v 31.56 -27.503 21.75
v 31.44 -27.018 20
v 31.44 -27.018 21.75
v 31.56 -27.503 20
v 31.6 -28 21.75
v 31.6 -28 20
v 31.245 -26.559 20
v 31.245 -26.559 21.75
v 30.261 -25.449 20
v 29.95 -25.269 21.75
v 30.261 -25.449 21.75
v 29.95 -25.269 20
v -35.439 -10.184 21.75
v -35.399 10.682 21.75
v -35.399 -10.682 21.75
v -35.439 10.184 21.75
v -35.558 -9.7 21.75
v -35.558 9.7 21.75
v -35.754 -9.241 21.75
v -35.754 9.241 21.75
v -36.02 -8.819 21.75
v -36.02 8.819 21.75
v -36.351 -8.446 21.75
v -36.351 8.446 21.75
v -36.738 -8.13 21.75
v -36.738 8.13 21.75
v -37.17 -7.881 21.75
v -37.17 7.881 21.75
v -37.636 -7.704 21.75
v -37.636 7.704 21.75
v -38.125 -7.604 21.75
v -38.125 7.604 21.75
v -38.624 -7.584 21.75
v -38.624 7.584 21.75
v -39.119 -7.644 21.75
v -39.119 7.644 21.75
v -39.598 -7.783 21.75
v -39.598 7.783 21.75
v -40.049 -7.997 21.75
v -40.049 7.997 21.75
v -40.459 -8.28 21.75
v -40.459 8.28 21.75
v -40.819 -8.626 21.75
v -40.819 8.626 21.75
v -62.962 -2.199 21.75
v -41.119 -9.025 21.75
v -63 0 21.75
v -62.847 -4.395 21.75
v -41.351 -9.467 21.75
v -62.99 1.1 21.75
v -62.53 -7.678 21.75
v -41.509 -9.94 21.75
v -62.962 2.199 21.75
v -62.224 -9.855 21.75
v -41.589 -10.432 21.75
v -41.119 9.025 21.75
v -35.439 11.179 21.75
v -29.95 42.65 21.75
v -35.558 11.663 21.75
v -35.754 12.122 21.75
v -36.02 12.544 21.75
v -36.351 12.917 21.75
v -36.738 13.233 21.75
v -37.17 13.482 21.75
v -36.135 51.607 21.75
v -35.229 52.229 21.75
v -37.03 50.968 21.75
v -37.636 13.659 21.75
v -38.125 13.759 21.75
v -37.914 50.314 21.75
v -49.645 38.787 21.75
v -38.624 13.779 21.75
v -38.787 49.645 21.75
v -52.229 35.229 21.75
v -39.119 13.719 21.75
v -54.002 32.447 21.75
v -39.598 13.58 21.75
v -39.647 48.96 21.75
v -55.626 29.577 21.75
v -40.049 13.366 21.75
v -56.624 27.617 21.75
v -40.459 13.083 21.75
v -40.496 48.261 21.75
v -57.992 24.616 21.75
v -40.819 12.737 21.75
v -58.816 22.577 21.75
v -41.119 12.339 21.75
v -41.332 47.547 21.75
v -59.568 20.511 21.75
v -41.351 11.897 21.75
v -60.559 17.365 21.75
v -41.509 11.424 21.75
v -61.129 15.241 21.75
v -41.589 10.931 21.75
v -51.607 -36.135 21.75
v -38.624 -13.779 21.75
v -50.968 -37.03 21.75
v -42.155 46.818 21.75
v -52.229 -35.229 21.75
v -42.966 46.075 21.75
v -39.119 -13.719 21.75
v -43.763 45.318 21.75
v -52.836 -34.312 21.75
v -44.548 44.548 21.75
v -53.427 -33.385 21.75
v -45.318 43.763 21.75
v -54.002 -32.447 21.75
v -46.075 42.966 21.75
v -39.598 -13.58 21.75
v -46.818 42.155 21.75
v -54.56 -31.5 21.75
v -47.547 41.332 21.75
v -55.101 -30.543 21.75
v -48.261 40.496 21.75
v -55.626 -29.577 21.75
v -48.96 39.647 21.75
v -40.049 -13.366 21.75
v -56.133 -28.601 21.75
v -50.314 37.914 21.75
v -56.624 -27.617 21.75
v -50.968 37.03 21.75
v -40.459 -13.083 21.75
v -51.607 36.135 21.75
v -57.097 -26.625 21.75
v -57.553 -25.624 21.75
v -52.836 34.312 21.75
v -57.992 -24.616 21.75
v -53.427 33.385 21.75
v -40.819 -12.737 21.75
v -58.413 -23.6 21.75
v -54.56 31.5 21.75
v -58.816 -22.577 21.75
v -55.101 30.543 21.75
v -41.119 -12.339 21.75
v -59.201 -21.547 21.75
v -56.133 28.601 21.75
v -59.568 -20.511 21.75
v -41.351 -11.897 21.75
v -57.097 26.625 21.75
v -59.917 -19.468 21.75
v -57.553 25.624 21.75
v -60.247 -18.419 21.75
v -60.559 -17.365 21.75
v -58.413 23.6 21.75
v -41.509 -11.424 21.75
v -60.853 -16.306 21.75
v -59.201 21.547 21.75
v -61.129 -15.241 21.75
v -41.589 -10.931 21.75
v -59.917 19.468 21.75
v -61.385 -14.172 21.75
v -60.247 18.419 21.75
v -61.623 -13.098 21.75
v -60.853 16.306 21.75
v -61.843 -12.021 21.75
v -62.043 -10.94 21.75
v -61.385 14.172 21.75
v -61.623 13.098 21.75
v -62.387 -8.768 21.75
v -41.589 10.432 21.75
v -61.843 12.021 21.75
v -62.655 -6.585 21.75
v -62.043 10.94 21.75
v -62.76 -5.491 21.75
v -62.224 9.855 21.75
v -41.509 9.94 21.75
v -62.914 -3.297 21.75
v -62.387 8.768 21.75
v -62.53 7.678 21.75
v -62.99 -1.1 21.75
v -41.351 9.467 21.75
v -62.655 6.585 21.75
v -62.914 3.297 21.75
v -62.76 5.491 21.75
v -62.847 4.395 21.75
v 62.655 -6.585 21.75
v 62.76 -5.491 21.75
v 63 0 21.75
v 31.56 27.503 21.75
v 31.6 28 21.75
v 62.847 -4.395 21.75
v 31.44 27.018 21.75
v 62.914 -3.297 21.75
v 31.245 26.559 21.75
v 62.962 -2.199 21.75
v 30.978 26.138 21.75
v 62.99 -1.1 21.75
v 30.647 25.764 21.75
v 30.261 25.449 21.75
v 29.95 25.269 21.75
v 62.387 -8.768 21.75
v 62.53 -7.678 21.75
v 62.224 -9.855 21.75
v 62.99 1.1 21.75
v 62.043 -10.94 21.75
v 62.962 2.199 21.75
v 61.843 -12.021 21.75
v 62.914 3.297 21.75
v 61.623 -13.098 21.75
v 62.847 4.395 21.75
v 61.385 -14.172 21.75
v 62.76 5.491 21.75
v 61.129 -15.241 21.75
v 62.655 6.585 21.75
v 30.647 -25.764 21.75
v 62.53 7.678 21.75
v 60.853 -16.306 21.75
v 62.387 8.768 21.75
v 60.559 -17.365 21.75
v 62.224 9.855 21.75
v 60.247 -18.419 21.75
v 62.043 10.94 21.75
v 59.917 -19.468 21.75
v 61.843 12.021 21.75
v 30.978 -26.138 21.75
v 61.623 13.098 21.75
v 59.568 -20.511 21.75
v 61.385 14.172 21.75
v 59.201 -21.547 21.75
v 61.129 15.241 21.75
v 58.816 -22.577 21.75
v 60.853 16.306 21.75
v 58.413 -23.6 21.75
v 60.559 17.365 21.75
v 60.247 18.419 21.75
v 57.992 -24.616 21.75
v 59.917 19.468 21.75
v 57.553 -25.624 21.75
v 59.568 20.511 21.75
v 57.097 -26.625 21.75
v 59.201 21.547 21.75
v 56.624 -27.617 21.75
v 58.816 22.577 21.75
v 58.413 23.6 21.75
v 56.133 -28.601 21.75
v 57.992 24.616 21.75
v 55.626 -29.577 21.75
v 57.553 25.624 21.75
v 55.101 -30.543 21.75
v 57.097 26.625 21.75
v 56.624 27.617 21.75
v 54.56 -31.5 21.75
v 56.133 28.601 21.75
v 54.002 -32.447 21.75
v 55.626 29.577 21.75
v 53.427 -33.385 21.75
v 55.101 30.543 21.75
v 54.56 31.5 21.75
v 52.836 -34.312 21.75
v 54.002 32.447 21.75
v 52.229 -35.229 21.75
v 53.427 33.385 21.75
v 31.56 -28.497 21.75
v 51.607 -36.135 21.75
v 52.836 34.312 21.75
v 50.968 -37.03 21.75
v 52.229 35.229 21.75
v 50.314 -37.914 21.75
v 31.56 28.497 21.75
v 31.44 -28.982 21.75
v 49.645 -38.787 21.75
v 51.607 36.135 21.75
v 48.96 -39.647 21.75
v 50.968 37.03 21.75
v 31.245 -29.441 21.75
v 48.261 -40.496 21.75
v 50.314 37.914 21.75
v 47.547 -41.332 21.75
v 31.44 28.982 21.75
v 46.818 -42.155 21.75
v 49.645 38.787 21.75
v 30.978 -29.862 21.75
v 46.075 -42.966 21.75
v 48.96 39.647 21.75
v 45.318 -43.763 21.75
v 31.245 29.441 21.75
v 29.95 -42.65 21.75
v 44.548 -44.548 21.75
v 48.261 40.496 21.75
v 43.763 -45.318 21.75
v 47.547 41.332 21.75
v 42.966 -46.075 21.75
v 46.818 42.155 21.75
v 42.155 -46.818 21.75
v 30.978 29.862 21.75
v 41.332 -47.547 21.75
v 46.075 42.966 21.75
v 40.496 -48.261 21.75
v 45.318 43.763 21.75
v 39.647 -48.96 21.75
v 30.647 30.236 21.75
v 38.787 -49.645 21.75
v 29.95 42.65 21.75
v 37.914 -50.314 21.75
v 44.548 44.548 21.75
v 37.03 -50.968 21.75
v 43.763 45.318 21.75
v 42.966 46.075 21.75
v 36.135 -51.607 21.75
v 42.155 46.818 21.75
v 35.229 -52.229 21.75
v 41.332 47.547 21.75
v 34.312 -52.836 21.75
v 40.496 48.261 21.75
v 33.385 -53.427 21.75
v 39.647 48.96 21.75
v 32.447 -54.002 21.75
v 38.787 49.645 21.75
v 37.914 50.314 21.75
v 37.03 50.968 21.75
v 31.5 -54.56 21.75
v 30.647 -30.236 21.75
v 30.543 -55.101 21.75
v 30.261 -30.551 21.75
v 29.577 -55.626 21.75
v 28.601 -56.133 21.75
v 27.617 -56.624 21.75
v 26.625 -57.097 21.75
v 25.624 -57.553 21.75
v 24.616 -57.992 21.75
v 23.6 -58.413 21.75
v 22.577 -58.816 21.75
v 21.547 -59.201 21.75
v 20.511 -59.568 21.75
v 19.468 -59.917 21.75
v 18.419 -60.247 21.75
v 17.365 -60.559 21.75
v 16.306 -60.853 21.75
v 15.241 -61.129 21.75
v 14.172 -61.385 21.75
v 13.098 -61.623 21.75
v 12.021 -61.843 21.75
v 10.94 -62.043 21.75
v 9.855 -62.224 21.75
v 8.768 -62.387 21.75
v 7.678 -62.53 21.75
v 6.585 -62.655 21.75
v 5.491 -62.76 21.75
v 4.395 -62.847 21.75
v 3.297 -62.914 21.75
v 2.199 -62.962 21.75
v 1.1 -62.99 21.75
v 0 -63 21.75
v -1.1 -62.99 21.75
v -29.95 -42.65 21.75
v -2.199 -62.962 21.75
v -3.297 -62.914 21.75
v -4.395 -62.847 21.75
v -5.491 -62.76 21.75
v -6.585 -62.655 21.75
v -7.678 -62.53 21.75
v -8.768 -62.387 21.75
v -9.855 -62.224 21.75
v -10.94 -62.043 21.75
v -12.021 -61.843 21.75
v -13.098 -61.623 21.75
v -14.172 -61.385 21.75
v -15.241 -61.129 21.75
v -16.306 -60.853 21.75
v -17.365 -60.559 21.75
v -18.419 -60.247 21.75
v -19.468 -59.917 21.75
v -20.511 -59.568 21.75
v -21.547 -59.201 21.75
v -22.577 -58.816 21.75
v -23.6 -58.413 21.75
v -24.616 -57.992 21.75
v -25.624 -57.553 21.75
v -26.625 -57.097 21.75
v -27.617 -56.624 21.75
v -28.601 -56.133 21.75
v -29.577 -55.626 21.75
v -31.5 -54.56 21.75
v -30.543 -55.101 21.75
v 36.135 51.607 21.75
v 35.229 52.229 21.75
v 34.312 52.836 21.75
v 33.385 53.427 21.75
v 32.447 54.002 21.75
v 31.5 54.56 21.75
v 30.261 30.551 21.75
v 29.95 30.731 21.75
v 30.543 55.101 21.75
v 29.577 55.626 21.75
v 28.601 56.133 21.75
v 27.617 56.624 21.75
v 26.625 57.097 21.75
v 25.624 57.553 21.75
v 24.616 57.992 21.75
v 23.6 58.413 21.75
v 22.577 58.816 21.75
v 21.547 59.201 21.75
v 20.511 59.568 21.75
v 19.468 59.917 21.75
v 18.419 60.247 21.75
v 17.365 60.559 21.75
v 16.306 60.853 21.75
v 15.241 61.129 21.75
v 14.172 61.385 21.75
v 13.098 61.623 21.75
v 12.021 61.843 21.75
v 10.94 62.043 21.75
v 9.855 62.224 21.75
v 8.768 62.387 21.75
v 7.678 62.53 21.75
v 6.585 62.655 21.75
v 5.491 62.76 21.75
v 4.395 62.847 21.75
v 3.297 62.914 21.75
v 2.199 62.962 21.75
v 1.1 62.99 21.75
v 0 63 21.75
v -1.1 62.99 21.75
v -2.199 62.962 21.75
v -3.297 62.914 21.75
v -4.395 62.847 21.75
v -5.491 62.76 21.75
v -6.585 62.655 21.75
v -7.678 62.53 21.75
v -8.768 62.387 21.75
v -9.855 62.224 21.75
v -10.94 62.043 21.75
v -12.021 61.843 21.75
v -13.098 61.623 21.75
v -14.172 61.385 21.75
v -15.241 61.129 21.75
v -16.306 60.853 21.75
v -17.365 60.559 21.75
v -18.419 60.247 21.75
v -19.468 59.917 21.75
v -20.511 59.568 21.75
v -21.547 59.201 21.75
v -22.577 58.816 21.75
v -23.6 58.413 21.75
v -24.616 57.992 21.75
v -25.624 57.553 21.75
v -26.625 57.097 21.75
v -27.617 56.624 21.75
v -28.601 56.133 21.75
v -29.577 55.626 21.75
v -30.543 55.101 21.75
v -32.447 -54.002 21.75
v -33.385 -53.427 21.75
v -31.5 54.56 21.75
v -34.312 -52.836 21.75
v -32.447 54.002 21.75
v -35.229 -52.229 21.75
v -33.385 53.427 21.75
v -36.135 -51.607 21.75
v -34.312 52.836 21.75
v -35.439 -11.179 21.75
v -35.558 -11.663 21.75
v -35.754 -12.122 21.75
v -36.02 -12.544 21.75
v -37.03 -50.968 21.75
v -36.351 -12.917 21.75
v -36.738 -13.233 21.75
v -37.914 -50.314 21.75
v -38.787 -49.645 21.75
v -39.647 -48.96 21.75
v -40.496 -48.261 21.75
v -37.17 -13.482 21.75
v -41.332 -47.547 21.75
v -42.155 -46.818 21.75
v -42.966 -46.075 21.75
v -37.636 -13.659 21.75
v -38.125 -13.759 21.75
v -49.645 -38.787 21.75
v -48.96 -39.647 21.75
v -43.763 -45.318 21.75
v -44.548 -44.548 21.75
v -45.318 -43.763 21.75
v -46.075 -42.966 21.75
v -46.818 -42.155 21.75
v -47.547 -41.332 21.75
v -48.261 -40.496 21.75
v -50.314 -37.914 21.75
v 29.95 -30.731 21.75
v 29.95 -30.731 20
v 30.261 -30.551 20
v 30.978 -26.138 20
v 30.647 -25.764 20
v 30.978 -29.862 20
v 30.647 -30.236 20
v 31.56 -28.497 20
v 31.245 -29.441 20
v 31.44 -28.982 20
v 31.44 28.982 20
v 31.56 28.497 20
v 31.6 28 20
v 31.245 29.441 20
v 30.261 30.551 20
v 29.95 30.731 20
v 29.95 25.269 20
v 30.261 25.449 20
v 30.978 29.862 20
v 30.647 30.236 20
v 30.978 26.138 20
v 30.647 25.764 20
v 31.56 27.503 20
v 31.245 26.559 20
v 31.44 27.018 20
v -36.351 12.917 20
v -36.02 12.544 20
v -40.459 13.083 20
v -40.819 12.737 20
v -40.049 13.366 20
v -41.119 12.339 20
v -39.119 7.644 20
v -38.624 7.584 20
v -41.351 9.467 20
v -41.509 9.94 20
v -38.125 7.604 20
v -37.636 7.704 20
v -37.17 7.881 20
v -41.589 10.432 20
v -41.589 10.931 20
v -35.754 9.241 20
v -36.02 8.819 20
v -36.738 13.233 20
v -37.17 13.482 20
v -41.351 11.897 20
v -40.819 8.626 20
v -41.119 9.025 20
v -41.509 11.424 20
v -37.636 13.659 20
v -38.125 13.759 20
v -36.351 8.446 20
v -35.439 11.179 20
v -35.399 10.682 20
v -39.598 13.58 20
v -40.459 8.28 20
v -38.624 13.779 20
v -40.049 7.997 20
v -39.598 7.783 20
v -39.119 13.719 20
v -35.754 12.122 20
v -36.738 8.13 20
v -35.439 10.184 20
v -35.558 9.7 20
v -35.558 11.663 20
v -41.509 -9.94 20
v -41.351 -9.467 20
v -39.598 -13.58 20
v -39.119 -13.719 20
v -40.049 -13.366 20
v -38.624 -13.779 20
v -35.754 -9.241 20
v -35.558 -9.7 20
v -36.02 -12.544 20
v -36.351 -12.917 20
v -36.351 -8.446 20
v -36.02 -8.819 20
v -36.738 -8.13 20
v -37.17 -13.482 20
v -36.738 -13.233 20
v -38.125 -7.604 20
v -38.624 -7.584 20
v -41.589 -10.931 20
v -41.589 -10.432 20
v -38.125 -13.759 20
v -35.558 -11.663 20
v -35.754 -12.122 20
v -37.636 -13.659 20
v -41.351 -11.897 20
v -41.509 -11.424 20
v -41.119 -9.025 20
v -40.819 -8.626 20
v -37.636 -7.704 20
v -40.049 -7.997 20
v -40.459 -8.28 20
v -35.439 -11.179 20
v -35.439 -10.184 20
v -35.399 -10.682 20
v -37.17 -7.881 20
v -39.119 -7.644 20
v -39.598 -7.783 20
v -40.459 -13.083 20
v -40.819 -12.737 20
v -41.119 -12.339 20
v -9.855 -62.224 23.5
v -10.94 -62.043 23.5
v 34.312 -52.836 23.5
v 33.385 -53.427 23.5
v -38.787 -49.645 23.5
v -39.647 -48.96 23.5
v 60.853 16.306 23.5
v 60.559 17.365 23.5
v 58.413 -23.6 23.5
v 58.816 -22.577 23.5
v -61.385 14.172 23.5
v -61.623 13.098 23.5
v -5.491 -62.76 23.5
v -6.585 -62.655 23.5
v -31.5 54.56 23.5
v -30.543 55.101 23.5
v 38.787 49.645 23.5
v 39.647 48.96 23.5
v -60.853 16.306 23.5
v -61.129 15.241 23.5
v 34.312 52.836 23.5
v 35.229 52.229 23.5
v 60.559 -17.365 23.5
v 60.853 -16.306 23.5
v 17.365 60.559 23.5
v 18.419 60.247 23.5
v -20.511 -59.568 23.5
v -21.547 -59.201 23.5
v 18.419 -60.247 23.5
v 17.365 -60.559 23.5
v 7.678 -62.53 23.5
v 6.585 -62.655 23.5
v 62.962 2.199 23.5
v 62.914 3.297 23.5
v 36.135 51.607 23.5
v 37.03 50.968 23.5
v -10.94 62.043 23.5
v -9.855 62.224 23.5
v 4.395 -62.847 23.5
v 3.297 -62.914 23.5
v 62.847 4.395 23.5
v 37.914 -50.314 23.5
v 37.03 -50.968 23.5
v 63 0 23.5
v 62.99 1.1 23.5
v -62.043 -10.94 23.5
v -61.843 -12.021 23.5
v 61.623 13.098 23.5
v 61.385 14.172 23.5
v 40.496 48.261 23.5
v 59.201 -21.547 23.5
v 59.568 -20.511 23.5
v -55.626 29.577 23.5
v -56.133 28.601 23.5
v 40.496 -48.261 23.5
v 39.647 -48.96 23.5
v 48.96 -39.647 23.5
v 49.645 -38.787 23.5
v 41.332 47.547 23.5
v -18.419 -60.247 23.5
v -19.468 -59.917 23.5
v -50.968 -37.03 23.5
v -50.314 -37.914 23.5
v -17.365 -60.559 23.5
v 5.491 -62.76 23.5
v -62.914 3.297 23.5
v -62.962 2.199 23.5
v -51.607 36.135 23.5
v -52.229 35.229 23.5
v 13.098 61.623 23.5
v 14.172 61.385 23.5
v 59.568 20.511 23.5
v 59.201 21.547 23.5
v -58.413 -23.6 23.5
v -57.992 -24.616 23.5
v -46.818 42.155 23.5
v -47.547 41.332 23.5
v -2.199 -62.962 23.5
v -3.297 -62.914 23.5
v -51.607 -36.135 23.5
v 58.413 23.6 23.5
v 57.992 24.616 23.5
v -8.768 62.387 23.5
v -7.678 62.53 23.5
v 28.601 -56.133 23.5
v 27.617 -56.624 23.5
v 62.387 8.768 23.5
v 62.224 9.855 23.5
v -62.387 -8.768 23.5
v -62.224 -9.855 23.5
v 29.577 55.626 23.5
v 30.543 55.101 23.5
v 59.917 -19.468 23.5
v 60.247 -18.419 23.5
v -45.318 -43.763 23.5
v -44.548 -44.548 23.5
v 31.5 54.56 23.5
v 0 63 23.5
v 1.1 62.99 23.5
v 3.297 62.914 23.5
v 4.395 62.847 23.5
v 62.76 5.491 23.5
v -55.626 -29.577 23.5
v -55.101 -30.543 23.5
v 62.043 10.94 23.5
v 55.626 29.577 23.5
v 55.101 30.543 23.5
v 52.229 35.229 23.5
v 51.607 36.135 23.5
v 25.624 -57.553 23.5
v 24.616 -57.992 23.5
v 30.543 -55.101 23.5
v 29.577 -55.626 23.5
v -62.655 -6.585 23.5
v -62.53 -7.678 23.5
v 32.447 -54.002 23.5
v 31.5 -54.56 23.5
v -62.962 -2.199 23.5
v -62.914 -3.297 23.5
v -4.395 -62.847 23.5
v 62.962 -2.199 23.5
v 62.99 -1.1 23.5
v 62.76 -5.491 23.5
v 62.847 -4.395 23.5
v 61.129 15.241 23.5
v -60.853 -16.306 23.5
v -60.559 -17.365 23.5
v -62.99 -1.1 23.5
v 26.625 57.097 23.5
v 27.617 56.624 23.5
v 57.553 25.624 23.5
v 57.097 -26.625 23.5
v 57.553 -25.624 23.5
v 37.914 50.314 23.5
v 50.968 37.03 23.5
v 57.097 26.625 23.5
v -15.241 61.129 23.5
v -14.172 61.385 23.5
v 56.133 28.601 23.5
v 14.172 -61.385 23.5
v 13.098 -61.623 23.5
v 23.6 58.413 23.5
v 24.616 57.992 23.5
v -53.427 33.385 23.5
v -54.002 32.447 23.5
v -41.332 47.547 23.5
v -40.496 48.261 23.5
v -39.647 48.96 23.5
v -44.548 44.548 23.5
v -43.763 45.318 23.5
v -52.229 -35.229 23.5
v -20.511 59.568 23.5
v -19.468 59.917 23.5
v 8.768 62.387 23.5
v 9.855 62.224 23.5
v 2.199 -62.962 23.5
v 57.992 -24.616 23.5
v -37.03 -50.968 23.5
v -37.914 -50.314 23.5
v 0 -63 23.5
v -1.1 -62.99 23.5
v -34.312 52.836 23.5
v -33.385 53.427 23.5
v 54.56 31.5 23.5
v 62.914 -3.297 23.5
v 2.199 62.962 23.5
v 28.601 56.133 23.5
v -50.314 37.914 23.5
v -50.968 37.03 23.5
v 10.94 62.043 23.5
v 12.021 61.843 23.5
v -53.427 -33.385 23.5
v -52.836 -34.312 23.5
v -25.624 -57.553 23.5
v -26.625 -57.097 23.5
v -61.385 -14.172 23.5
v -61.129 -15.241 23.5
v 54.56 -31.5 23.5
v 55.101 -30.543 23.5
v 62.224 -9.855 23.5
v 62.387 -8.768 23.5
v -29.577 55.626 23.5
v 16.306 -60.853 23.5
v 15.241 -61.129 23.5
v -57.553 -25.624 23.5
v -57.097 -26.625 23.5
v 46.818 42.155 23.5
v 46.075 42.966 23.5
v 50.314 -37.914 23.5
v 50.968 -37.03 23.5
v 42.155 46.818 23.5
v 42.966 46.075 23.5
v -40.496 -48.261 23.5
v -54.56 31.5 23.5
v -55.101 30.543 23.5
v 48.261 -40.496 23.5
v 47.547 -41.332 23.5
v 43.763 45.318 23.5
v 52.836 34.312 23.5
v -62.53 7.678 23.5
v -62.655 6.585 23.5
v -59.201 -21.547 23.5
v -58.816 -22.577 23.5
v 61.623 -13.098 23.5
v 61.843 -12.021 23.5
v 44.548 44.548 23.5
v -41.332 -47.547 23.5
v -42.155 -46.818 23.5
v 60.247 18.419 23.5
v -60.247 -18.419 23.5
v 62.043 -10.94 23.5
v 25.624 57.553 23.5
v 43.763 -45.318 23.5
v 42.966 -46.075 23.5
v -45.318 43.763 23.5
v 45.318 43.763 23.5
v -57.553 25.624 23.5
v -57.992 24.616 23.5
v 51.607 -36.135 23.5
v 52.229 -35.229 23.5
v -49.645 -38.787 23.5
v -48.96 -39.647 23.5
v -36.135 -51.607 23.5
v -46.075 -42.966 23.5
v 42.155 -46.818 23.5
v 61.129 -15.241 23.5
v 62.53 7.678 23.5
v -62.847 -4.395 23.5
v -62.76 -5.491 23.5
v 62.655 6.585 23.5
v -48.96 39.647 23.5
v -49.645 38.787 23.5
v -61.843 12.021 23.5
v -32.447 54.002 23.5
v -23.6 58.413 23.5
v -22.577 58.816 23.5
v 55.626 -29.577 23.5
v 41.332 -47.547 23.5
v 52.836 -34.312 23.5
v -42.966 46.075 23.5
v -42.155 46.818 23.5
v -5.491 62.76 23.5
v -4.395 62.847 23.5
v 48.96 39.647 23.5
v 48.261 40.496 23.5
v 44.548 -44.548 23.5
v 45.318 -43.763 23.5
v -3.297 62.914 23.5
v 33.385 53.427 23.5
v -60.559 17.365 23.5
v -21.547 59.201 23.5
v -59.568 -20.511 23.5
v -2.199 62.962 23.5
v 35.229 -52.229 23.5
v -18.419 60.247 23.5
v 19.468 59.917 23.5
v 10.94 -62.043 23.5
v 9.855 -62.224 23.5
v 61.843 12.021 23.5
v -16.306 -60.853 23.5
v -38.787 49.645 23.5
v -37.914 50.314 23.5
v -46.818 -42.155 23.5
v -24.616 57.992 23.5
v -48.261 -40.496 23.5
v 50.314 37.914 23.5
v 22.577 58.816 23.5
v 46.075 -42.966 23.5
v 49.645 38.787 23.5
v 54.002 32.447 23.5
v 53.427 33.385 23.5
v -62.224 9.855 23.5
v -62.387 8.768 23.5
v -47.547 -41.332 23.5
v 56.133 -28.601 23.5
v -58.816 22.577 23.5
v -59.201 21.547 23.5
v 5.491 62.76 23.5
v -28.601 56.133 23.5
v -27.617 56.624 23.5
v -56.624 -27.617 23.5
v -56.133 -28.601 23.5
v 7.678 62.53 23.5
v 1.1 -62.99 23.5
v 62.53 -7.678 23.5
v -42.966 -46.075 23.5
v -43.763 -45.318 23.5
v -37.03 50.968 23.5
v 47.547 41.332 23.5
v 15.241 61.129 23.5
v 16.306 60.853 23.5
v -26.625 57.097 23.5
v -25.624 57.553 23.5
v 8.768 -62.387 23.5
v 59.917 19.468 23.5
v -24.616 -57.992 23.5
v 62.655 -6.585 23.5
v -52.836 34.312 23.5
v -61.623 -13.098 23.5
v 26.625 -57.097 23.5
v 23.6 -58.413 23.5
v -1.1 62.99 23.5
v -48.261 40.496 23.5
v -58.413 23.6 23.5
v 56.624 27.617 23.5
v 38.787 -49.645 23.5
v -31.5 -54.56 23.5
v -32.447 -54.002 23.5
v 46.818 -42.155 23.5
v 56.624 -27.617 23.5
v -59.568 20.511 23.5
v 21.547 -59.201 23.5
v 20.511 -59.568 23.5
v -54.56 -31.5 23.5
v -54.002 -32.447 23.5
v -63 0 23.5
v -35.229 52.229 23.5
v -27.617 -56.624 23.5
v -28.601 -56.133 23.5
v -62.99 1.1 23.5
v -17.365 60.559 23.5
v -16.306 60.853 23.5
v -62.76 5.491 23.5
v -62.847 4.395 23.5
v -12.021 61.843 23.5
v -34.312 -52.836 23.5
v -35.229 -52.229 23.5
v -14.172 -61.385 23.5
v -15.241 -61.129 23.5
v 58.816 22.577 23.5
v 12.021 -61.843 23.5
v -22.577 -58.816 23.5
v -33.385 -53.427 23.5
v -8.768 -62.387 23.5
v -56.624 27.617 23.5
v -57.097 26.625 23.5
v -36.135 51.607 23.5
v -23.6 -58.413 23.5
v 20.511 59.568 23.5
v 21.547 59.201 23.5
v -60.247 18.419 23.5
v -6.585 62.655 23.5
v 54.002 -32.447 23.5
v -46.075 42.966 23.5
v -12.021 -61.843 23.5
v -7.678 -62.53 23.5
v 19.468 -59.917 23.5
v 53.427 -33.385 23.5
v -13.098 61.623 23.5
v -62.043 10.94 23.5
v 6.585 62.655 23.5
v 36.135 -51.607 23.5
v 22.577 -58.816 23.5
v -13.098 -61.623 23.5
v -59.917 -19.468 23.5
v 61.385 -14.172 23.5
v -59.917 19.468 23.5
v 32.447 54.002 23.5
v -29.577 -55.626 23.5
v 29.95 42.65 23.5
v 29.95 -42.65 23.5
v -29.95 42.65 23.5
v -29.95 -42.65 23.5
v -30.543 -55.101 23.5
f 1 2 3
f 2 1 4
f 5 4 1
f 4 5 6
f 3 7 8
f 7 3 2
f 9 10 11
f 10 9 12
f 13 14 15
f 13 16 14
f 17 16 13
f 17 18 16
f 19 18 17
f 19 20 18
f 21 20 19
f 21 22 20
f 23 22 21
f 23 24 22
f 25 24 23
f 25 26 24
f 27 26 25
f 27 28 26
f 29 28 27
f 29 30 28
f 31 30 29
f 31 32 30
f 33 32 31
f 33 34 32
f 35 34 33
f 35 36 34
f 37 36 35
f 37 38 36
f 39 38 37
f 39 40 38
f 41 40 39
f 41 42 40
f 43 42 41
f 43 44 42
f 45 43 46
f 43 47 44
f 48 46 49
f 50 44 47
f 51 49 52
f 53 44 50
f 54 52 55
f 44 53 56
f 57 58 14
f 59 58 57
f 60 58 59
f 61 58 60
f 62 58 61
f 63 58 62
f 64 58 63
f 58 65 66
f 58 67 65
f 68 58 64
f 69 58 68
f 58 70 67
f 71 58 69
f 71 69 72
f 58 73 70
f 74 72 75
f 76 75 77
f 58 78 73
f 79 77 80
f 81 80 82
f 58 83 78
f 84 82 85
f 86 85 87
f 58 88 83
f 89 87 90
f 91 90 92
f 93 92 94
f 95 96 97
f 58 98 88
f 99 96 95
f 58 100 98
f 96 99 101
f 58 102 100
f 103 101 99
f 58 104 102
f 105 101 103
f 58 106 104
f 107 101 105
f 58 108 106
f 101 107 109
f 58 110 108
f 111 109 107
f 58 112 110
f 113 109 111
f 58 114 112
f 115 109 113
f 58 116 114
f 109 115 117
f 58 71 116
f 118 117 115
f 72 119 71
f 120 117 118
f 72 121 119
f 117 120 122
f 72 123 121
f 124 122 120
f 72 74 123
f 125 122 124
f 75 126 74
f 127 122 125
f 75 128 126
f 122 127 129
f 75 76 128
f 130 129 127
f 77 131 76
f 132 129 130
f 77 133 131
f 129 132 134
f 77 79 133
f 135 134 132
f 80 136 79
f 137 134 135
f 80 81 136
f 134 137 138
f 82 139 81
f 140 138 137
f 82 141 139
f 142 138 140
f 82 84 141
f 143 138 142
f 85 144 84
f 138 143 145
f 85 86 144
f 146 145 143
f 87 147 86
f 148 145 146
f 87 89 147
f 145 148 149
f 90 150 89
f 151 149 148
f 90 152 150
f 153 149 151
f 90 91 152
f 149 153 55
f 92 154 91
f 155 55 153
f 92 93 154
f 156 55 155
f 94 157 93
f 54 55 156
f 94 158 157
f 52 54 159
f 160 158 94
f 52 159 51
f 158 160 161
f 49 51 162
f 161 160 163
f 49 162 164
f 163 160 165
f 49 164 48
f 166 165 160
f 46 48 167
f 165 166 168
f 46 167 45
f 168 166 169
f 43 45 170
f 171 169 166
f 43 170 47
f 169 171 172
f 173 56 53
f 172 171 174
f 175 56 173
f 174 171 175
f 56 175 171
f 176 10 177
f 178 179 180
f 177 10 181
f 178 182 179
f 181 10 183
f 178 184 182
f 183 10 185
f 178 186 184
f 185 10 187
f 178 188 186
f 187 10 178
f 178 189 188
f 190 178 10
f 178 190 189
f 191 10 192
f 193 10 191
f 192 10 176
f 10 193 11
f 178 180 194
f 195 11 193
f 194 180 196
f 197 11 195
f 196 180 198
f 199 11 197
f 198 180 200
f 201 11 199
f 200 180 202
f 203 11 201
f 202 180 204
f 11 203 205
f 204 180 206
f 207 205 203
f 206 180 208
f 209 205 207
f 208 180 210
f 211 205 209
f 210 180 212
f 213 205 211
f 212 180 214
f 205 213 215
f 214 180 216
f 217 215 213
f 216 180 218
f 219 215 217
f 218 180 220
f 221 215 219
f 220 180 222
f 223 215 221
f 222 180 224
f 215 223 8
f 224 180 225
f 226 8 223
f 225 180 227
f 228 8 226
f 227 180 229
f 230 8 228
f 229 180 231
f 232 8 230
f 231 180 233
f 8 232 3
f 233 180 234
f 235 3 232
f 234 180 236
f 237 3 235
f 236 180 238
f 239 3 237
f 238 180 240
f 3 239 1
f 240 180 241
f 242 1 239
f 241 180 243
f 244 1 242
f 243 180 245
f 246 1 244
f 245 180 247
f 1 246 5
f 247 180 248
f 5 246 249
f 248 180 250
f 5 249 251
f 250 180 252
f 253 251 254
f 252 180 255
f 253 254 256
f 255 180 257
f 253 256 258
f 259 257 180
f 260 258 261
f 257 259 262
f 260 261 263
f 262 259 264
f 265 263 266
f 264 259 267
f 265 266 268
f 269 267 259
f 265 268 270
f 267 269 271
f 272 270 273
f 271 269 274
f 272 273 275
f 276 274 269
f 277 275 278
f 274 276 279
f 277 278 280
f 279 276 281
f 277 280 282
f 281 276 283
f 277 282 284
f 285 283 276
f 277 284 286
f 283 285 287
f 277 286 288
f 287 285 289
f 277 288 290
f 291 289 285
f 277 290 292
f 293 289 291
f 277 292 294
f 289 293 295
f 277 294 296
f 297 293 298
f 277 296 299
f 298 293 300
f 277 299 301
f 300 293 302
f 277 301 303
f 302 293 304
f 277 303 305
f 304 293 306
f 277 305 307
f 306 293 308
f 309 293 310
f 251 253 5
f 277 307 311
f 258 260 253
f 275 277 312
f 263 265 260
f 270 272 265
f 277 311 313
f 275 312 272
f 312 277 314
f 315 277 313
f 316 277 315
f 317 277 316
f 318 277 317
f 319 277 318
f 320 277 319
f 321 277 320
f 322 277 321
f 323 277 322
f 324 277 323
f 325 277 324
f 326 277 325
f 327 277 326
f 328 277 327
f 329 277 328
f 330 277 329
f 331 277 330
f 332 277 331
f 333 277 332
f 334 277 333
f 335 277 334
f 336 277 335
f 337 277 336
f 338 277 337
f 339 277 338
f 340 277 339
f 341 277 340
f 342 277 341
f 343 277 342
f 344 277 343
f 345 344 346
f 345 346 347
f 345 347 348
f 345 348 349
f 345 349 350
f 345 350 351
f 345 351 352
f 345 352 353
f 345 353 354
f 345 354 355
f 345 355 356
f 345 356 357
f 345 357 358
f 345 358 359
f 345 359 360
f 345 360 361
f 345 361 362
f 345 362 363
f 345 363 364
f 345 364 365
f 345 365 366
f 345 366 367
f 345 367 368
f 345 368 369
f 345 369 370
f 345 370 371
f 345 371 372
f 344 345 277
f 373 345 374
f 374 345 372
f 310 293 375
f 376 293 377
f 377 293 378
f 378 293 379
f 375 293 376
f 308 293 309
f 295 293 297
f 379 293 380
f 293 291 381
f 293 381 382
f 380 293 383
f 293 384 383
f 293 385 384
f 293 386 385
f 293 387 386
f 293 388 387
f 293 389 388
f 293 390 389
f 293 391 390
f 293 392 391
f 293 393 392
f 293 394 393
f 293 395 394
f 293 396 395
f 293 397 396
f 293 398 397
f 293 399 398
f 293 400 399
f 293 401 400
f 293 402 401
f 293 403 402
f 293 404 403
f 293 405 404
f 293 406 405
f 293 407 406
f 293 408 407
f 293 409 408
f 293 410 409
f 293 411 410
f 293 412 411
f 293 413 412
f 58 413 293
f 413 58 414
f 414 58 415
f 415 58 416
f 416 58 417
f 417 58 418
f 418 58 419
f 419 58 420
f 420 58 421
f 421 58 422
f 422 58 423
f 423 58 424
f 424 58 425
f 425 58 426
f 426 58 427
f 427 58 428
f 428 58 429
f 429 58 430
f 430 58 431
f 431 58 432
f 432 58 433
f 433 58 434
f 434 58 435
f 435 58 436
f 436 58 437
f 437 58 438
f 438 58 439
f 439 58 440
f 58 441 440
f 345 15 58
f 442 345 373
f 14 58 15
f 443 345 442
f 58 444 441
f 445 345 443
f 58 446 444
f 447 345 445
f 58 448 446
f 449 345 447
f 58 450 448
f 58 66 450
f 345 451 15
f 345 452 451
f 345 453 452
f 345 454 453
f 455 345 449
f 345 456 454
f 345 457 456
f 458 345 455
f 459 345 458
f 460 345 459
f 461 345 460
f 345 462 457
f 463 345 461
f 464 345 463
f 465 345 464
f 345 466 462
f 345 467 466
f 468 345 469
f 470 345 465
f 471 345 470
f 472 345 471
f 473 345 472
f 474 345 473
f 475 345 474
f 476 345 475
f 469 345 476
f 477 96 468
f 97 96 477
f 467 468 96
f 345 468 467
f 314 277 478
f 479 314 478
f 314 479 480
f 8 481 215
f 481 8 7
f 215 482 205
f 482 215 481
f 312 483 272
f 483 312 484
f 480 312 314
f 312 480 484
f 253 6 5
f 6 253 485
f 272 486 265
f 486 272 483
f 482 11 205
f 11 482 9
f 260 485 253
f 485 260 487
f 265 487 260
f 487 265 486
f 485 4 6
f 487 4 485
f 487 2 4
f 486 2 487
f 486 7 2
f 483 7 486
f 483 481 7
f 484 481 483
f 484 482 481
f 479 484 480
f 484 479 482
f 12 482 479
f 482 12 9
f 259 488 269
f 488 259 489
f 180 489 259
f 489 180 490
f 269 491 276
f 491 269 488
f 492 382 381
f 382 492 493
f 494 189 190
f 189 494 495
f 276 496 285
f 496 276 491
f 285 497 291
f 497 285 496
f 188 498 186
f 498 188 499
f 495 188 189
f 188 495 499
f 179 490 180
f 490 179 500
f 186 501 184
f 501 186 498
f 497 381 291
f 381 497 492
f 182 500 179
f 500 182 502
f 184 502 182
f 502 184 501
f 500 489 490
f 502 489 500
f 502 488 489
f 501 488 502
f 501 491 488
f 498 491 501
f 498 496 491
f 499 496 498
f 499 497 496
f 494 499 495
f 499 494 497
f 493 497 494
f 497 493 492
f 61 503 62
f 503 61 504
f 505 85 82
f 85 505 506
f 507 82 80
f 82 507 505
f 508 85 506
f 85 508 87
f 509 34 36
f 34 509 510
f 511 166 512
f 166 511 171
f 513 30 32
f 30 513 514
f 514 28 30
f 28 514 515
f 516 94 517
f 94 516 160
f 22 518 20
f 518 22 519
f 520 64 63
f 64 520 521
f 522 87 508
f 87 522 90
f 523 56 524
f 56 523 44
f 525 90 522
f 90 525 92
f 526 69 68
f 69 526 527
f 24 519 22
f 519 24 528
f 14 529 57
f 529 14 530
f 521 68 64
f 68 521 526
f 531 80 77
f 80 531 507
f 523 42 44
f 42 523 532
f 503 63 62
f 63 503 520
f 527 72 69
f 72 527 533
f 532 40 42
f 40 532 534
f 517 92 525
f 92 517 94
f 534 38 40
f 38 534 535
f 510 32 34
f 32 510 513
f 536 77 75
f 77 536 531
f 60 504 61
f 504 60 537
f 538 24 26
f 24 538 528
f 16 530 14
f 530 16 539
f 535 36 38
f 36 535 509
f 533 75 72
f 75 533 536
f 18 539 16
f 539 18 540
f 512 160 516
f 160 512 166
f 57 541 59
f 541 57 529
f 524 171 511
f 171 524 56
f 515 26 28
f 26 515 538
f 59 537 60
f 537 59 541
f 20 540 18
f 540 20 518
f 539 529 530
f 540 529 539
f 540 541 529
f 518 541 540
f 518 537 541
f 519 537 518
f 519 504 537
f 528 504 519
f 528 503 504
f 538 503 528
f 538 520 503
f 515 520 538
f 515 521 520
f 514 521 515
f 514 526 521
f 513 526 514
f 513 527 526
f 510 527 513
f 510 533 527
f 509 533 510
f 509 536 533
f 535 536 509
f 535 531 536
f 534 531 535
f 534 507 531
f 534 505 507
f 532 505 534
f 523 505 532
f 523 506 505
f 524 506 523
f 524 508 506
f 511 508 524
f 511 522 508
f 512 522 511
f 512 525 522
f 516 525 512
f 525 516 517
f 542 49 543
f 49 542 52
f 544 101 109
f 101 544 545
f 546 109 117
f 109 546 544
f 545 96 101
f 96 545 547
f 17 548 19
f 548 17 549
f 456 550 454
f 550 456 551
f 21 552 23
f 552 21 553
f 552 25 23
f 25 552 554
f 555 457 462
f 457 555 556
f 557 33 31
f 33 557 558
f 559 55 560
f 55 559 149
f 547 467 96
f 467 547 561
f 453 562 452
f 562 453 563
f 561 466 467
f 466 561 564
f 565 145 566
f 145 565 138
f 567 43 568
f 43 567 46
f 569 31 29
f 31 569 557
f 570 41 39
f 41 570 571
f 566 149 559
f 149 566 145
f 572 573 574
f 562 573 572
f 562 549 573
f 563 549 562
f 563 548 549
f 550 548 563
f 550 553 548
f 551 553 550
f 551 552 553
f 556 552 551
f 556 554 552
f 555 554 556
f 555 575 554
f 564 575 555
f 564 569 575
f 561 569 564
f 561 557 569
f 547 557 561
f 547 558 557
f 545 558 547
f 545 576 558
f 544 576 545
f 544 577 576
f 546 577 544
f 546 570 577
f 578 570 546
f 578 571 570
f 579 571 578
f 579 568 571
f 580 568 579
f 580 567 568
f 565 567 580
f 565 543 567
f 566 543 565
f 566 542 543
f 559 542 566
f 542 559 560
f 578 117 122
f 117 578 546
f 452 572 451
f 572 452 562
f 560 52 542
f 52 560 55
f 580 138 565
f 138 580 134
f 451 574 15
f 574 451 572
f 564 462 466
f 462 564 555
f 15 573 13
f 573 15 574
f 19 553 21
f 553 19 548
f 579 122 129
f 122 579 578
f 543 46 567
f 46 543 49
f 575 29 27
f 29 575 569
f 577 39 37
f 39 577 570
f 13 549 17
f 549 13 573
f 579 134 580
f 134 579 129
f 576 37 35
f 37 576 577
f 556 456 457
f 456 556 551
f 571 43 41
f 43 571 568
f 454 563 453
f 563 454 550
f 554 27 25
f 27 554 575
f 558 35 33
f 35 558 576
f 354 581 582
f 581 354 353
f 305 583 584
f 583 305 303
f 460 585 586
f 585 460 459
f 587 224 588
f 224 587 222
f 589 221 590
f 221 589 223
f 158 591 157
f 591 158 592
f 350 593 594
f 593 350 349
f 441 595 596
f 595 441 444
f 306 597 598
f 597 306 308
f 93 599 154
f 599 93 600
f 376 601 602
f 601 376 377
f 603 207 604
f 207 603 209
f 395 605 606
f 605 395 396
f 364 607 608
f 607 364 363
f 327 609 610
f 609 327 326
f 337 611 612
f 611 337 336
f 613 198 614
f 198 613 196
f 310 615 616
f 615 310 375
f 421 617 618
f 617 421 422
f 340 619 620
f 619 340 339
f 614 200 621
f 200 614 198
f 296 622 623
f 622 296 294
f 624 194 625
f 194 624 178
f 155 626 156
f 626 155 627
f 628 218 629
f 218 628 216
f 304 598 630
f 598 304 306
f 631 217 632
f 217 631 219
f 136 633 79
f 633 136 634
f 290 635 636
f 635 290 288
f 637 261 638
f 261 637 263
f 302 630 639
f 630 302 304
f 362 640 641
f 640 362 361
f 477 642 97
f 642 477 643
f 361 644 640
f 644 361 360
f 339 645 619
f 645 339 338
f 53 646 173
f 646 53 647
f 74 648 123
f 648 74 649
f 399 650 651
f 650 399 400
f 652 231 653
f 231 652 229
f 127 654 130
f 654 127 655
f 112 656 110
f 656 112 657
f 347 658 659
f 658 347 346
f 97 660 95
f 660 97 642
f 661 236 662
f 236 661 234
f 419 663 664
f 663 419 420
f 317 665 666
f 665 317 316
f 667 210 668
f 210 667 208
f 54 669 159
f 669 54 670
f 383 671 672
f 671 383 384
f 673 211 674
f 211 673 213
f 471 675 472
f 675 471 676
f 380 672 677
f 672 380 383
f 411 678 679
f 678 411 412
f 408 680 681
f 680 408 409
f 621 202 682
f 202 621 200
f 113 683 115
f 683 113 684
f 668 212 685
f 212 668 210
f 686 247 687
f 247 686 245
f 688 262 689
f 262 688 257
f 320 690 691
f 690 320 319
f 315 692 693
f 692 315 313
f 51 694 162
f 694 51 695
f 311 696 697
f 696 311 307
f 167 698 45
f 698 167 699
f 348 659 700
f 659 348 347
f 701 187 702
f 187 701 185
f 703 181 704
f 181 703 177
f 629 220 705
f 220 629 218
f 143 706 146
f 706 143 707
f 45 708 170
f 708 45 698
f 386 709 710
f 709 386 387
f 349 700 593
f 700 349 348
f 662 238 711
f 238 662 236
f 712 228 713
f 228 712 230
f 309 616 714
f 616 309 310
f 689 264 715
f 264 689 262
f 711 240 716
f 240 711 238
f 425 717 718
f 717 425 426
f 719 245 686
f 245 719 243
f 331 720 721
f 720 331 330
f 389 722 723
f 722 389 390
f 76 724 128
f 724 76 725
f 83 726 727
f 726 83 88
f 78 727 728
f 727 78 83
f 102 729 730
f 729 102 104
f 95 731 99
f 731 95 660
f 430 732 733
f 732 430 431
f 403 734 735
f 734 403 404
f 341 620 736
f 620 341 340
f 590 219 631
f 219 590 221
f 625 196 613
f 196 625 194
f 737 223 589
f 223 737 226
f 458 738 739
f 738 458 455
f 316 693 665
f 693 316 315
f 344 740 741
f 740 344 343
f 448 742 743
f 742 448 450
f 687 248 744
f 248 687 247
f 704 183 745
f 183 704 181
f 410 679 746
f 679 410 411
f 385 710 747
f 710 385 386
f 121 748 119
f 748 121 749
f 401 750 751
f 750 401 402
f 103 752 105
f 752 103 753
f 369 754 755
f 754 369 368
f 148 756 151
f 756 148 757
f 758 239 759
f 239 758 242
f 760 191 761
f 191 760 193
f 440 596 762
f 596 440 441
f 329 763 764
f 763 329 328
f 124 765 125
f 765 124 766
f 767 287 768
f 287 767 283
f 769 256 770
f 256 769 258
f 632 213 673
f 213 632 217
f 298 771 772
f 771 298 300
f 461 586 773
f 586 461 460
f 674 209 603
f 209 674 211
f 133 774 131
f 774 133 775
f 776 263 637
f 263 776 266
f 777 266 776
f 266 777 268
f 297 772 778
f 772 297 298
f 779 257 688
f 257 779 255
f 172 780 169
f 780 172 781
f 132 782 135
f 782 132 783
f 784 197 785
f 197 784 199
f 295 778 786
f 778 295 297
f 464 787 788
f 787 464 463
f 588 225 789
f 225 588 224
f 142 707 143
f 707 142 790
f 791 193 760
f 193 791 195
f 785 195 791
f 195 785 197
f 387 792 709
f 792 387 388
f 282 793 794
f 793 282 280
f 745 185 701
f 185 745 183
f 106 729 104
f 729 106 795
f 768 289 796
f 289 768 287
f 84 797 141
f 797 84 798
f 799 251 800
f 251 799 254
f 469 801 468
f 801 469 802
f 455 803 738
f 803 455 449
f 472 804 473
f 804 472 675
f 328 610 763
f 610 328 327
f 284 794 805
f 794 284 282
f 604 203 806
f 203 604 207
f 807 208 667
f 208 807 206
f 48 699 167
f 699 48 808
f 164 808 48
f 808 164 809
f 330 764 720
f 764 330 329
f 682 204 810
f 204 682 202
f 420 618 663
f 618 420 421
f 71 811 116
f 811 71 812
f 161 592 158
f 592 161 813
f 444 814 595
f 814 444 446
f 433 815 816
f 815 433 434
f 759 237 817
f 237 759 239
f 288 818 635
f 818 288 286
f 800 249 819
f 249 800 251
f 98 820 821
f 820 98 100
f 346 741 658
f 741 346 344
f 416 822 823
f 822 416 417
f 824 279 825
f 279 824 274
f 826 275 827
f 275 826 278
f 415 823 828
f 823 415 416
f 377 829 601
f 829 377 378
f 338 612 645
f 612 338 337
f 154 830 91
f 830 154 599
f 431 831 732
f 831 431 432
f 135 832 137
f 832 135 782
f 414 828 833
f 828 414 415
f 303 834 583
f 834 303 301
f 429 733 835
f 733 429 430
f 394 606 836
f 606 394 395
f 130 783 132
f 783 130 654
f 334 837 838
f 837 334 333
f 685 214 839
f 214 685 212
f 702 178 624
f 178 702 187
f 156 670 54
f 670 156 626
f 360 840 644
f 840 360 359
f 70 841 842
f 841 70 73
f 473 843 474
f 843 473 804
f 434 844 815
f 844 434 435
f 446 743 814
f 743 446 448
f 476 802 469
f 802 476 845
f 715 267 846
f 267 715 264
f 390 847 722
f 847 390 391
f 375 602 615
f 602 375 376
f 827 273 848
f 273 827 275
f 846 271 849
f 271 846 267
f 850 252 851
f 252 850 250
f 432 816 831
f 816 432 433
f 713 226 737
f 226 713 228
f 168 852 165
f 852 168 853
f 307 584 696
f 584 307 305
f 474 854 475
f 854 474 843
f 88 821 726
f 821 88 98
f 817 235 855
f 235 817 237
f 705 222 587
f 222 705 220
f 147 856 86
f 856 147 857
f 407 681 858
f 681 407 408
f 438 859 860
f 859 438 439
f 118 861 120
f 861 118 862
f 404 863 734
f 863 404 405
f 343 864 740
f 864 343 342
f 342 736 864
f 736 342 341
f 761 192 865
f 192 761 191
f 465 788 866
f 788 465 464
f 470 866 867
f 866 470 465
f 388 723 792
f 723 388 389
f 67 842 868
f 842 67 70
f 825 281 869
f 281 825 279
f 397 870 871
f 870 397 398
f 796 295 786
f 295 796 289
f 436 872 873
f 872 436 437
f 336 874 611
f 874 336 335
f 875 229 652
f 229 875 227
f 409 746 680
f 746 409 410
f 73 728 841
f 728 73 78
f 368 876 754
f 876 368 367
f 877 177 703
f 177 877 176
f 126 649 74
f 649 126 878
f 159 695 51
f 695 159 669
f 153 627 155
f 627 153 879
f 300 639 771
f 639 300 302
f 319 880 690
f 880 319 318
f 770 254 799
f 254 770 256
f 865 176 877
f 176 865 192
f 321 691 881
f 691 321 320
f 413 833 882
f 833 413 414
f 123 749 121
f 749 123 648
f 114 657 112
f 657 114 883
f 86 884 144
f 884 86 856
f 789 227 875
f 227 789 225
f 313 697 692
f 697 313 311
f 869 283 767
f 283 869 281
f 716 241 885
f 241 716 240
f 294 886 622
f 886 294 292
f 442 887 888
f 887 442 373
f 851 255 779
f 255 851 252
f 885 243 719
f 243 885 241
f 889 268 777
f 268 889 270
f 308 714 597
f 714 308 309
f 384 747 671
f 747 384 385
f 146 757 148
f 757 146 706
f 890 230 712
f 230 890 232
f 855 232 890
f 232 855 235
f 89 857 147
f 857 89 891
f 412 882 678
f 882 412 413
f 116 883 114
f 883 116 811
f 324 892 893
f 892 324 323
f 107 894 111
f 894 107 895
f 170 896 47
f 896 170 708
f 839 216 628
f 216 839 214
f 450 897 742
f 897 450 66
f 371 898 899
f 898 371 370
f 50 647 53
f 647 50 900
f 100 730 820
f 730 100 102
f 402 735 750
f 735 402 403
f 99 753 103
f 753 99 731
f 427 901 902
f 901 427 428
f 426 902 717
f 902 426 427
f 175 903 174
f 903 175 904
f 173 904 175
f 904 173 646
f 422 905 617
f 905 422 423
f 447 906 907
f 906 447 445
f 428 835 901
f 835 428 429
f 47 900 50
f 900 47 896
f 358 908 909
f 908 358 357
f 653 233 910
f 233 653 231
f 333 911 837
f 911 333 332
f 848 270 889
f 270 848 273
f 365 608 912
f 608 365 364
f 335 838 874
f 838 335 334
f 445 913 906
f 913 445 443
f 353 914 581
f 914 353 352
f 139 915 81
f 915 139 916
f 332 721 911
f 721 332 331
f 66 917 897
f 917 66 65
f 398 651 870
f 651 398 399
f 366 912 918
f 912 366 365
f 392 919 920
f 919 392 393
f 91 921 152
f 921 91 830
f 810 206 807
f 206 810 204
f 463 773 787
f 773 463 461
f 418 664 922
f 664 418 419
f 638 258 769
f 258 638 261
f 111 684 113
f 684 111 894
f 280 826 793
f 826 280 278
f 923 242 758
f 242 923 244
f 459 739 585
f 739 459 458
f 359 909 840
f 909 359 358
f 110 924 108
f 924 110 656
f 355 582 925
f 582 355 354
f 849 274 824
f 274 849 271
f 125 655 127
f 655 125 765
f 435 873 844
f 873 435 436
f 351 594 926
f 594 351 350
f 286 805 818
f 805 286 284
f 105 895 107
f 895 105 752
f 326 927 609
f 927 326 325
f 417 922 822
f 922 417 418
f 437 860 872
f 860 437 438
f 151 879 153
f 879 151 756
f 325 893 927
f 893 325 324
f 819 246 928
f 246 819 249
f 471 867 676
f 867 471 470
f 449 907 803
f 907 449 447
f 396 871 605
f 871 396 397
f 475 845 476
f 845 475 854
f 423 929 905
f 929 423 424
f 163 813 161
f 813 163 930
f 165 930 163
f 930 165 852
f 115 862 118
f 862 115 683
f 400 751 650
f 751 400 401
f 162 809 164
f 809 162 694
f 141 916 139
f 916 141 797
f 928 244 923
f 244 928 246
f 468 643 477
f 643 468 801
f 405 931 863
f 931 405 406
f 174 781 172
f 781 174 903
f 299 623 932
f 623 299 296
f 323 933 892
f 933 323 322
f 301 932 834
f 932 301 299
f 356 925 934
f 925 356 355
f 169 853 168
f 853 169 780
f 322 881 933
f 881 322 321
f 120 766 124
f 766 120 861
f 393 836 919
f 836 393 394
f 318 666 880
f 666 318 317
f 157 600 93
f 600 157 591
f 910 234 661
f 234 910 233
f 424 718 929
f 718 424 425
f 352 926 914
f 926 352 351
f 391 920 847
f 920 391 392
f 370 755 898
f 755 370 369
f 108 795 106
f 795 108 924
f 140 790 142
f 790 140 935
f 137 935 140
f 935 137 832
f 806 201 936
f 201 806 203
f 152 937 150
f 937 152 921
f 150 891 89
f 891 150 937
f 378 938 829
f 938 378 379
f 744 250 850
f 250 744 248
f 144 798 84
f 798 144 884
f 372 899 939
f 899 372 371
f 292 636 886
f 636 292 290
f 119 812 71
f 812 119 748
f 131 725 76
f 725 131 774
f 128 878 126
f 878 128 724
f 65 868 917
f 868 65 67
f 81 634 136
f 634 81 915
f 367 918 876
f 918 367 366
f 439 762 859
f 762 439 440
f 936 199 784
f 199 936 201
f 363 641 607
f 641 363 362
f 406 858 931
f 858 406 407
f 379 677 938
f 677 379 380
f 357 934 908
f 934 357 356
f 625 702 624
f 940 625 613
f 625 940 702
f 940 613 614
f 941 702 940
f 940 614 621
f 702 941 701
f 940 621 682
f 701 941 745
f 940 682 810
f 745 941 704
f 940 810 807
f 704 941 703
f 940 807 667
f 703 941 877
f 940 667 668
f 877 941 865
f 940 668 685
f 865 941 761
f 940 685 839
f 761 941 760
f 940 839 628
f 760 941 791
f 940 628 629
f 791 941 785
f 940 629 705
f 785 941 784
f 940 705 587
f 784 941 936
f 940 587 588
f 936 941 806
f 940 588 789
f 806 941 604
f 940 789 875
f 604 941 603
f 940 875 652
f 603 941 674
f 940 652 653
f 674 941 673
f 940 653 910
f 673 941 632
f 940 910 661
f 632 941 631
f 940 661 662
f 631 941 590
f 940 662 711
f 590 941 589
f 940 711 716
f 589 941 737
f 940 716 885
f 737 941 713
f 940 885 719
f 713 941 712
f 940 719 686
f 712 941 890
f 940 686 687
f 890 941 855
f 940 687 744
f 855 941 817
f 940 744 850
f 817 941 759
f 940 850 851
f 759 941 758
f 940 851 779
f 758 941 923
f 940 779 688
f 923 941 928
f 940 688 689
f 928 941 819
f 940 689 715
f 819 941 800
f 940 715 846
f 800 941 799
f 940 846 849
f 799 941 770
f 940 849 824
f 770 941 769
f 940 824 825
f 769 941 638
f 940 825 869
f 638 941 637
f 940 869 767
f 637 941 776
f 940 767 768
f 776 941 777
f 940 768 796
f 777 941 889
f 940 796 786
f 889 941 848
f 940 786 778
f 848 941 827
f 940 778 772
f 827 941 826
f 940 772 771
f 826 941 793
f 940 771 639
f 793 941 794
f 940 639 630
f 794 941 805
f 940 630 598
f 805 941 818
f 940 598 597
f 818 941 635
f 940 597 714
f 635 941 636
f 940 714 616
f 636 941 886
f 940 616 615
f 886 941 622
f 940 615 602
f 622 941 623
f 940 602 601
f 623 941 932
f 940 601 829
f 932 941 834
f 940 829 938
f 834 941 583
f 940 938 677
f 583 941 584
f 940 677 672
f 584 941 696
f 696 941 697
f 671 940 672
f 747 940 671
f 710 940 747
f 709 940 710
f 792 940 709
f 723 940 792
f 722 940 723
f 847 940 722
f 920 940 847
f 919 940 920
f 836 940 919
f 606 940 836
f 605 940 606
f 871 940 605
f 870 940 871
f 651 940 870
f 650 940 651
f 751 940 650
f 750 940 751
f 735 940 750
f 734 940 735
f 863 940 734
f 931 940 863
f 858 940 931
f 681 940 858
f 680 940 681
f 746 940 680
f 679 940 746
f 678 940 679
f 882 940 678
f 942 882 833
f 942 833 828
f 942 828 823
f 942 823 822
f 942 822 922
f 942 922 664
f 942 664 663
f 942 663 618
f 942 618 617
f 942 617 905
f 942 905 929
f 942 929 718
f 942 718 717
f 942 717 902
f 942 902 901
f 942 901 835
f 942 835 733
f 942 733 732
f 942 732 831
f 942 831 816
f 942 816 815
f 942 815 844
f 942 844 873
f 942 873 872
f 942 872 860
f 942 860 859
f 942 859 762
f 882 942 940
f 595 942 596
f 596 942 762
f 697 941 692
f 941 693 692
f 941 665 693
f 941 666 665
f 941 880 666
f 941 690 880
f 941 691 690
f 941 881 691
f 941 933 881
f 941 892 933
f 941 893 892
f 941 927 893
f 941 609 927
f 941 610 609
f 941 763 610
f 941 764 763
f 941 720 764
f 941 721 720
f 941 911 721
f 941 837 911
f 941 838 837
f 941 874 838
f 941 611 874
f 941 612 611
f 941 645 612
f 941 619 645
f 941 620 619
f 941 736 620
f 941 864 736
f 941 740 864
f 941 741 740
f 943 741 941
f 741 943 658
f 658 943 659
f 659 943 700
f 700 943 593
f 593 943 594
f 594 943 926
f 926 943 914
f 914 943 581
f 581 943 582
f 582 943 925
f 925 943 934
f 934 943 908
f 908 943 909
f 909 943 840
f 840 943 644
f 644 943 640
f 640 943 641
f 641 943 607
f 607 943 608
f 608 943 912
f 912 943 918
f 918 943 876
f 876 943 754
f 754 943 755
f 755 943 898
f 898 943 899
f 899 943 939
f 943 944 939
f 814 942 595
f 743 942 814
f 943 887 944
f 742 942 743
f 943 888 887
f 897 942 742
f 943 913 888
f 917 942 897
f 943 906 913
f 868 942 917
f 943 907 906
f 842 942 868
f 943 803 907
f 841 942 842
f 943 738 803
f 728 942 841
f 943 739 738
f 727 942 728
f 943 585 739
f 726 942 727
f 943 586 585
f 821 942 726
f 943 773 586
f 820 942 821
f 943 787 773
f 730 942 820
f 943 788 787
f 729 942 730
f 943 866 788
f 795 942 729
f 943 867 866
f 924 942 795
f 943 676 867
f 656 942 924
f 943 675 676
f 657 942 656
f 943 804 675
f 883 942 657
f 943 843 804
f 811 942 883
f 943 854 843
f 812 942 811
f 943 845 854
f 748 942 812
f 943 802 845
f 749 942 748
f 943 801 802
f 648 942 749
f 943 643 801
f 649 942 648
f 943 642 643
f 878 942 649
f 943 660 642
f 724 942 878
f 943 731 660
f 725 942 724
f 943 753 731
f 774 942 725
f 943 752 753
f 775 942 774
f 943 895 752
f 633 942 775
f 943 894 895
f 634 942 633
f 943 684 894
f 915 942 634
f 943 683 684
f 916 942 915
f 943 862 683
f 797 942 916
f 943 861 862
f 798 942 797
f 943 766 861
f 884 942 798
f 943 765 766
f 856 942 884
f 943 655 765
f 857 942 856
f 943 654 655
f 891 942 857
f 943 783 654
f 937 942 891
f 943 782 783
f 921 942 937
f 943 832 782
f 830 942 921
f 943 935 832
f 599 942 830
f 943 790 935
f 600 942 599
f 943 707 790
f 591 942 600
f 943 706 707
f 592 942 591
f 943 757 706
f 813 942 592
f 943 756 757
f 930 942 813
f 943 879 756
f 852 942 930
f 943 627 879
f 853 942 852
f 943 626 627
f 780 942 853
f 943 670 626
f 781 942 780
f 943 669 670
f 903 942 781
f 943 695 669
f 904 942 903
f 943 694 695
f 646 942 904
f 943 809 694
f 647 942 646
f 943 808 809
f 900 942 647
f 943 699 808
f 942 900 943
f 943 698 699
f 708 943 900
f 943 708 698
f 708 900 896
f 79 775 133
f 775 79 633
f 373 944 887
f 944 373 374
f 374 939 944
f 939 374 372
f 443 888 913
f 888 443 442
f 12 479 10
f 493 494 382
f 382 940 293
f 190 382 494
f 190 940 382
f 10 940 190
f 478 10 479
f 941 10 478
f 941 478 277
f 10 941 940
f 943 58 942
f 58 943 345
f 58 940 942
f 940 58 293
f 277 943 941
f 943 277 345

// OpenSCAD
magnetdistance_to_sides=56; //USE THIS TO MAXIMISE MOVEMENT POSSIBLE + s_holder_r_in & s_holder_M6_r
magnetdistance_from_base_r=21; //distance in x from base_r to magnets   
M6_r=3.3; //+0.3 for 3d-printing

M6magnet_cutout_dia=6;//can put magnets lower, now commented out
M6magnet_cutout_height=7;//can put magnets lower, now commented out

s_holder_r_top=28;  //s_holder_r_in; //only needed to differ from s_holder_r_in if uscope slide is to small... 
s_holder_r_top_height=3;//holding structure smaller than air-gap between objective and sample

s_holder_height=14;
s_holder_r_out=58;
// MAX MOVEMENT ADJUSTMENT: s_holder_r_in & s_holder_M6_r & magnetdistance_to_sides
// s_holder_r_in=35.5 in original size
s_holder_r_in=5.5;//ADJUST THIS TO MAXIMISE MOVEMENT "when the objective crushes into platform" 
//to find best place for screws and the dimensions of the place iterate manually until both ECHO messages (or green and yellow inner circles match and are at max
s_holder_M6_r=28.5; //ADJUST THIS TO MAXIMISE MOVEMENT "where the hex-screws are" 

/*
//make cylindical platform
difference (){
cylinder(r = s_holder_r_out, h = s_holder_height, $fa=1, $fs=0.5);
cylinder(r = s_holder_r_in, h = s_holder_height-s_holder_r_top_height, $fa=1, $fs=0.5);
cylinder(r = s_holder_r_top, h = s_holder_height, $fa=1, $fs=0.5);  

for(turn0 = [0 : 120 : 360])
rotate([0,0,turn0]){
//attachment M6+magnets    
translate ([s_holder_M6_r, -magnetdistance_to_sides/2,0])  
cylinder(r = M6_r, h = s_holder_height, $fa=1, $fs=0.5);
translate ([s_holder_M6_r, magnetdistance_to_sides/2,0])  
cylinder(r = M6_r, h = s_holder_height, $fa=1, $fs=0.5);
}
}

*/

//tolerance due to fff printing method
tolerance = 0.2;
slide_tolerance = 0.1;

//to avoid the need for supports during printing:
slide_holder_overhang = 5;

//size of an typical slide
// slide 2 is unused 
single_slide_lenght_1 = 85+tolerance;
single_slide_lenght_2 = 75+tolerance;
single_slide_width_1 = 29.7+tolerance;
single_slide_width_2 = 25+tolerance;

ring_widening = 5;

//create slide holding platform
color("red"){
translate ([0,0,20]){
difference(){

union(){



for(turn0 = [0 : 120 : 360])
rotate([0,0,turn0]){
//attachment poles    
translate ([s_holder_M6_r, -magnetdistance_to_sides/2,0])
cylinder(r = M6_r-tolerance, h = s_holder_height/8, $fa=1, $fs=0.5);
translate ([s_holder_M6_r, magnetdistance_to_sides/2,0])  
cylinder(r = M6_r-tolerance, h = s_holder_height/8, $fa=1, $fs=0.5);
}
translate ([0,0,s_holder_height/8])

//platform
difference(){
cylinder(r = s_holder_r_out+ring_widening, h = s_holder_height/8, $fa=1, $fs=0.5);
cylinder(r = s_holder_r_in, h = s_holder_height-s_holder_r_top_height, $fa=1, $fs=0.5);
cylinder(r = s_holder_r_top, h = s_holder_height, $fa=1, $fs=0.5);




}
}//end of union

// single slide frame
/*
rotate([0,0,15]){
cube(size = [single_slide_lenght_1,single_slide_width_1,s_holder_height], center = true);
}
rotate([0,0,-15]){
cube(size = [single_slide_lenght_2,single_slide_width_2,s_holder_height], center = true);
}
*/
// double slide frame
cube(size = [single_slide_width_1*2+slide_tolerance,single_slide_lenght_1+slide_tolerance,s_holder_height], center = true);
}
}
}
